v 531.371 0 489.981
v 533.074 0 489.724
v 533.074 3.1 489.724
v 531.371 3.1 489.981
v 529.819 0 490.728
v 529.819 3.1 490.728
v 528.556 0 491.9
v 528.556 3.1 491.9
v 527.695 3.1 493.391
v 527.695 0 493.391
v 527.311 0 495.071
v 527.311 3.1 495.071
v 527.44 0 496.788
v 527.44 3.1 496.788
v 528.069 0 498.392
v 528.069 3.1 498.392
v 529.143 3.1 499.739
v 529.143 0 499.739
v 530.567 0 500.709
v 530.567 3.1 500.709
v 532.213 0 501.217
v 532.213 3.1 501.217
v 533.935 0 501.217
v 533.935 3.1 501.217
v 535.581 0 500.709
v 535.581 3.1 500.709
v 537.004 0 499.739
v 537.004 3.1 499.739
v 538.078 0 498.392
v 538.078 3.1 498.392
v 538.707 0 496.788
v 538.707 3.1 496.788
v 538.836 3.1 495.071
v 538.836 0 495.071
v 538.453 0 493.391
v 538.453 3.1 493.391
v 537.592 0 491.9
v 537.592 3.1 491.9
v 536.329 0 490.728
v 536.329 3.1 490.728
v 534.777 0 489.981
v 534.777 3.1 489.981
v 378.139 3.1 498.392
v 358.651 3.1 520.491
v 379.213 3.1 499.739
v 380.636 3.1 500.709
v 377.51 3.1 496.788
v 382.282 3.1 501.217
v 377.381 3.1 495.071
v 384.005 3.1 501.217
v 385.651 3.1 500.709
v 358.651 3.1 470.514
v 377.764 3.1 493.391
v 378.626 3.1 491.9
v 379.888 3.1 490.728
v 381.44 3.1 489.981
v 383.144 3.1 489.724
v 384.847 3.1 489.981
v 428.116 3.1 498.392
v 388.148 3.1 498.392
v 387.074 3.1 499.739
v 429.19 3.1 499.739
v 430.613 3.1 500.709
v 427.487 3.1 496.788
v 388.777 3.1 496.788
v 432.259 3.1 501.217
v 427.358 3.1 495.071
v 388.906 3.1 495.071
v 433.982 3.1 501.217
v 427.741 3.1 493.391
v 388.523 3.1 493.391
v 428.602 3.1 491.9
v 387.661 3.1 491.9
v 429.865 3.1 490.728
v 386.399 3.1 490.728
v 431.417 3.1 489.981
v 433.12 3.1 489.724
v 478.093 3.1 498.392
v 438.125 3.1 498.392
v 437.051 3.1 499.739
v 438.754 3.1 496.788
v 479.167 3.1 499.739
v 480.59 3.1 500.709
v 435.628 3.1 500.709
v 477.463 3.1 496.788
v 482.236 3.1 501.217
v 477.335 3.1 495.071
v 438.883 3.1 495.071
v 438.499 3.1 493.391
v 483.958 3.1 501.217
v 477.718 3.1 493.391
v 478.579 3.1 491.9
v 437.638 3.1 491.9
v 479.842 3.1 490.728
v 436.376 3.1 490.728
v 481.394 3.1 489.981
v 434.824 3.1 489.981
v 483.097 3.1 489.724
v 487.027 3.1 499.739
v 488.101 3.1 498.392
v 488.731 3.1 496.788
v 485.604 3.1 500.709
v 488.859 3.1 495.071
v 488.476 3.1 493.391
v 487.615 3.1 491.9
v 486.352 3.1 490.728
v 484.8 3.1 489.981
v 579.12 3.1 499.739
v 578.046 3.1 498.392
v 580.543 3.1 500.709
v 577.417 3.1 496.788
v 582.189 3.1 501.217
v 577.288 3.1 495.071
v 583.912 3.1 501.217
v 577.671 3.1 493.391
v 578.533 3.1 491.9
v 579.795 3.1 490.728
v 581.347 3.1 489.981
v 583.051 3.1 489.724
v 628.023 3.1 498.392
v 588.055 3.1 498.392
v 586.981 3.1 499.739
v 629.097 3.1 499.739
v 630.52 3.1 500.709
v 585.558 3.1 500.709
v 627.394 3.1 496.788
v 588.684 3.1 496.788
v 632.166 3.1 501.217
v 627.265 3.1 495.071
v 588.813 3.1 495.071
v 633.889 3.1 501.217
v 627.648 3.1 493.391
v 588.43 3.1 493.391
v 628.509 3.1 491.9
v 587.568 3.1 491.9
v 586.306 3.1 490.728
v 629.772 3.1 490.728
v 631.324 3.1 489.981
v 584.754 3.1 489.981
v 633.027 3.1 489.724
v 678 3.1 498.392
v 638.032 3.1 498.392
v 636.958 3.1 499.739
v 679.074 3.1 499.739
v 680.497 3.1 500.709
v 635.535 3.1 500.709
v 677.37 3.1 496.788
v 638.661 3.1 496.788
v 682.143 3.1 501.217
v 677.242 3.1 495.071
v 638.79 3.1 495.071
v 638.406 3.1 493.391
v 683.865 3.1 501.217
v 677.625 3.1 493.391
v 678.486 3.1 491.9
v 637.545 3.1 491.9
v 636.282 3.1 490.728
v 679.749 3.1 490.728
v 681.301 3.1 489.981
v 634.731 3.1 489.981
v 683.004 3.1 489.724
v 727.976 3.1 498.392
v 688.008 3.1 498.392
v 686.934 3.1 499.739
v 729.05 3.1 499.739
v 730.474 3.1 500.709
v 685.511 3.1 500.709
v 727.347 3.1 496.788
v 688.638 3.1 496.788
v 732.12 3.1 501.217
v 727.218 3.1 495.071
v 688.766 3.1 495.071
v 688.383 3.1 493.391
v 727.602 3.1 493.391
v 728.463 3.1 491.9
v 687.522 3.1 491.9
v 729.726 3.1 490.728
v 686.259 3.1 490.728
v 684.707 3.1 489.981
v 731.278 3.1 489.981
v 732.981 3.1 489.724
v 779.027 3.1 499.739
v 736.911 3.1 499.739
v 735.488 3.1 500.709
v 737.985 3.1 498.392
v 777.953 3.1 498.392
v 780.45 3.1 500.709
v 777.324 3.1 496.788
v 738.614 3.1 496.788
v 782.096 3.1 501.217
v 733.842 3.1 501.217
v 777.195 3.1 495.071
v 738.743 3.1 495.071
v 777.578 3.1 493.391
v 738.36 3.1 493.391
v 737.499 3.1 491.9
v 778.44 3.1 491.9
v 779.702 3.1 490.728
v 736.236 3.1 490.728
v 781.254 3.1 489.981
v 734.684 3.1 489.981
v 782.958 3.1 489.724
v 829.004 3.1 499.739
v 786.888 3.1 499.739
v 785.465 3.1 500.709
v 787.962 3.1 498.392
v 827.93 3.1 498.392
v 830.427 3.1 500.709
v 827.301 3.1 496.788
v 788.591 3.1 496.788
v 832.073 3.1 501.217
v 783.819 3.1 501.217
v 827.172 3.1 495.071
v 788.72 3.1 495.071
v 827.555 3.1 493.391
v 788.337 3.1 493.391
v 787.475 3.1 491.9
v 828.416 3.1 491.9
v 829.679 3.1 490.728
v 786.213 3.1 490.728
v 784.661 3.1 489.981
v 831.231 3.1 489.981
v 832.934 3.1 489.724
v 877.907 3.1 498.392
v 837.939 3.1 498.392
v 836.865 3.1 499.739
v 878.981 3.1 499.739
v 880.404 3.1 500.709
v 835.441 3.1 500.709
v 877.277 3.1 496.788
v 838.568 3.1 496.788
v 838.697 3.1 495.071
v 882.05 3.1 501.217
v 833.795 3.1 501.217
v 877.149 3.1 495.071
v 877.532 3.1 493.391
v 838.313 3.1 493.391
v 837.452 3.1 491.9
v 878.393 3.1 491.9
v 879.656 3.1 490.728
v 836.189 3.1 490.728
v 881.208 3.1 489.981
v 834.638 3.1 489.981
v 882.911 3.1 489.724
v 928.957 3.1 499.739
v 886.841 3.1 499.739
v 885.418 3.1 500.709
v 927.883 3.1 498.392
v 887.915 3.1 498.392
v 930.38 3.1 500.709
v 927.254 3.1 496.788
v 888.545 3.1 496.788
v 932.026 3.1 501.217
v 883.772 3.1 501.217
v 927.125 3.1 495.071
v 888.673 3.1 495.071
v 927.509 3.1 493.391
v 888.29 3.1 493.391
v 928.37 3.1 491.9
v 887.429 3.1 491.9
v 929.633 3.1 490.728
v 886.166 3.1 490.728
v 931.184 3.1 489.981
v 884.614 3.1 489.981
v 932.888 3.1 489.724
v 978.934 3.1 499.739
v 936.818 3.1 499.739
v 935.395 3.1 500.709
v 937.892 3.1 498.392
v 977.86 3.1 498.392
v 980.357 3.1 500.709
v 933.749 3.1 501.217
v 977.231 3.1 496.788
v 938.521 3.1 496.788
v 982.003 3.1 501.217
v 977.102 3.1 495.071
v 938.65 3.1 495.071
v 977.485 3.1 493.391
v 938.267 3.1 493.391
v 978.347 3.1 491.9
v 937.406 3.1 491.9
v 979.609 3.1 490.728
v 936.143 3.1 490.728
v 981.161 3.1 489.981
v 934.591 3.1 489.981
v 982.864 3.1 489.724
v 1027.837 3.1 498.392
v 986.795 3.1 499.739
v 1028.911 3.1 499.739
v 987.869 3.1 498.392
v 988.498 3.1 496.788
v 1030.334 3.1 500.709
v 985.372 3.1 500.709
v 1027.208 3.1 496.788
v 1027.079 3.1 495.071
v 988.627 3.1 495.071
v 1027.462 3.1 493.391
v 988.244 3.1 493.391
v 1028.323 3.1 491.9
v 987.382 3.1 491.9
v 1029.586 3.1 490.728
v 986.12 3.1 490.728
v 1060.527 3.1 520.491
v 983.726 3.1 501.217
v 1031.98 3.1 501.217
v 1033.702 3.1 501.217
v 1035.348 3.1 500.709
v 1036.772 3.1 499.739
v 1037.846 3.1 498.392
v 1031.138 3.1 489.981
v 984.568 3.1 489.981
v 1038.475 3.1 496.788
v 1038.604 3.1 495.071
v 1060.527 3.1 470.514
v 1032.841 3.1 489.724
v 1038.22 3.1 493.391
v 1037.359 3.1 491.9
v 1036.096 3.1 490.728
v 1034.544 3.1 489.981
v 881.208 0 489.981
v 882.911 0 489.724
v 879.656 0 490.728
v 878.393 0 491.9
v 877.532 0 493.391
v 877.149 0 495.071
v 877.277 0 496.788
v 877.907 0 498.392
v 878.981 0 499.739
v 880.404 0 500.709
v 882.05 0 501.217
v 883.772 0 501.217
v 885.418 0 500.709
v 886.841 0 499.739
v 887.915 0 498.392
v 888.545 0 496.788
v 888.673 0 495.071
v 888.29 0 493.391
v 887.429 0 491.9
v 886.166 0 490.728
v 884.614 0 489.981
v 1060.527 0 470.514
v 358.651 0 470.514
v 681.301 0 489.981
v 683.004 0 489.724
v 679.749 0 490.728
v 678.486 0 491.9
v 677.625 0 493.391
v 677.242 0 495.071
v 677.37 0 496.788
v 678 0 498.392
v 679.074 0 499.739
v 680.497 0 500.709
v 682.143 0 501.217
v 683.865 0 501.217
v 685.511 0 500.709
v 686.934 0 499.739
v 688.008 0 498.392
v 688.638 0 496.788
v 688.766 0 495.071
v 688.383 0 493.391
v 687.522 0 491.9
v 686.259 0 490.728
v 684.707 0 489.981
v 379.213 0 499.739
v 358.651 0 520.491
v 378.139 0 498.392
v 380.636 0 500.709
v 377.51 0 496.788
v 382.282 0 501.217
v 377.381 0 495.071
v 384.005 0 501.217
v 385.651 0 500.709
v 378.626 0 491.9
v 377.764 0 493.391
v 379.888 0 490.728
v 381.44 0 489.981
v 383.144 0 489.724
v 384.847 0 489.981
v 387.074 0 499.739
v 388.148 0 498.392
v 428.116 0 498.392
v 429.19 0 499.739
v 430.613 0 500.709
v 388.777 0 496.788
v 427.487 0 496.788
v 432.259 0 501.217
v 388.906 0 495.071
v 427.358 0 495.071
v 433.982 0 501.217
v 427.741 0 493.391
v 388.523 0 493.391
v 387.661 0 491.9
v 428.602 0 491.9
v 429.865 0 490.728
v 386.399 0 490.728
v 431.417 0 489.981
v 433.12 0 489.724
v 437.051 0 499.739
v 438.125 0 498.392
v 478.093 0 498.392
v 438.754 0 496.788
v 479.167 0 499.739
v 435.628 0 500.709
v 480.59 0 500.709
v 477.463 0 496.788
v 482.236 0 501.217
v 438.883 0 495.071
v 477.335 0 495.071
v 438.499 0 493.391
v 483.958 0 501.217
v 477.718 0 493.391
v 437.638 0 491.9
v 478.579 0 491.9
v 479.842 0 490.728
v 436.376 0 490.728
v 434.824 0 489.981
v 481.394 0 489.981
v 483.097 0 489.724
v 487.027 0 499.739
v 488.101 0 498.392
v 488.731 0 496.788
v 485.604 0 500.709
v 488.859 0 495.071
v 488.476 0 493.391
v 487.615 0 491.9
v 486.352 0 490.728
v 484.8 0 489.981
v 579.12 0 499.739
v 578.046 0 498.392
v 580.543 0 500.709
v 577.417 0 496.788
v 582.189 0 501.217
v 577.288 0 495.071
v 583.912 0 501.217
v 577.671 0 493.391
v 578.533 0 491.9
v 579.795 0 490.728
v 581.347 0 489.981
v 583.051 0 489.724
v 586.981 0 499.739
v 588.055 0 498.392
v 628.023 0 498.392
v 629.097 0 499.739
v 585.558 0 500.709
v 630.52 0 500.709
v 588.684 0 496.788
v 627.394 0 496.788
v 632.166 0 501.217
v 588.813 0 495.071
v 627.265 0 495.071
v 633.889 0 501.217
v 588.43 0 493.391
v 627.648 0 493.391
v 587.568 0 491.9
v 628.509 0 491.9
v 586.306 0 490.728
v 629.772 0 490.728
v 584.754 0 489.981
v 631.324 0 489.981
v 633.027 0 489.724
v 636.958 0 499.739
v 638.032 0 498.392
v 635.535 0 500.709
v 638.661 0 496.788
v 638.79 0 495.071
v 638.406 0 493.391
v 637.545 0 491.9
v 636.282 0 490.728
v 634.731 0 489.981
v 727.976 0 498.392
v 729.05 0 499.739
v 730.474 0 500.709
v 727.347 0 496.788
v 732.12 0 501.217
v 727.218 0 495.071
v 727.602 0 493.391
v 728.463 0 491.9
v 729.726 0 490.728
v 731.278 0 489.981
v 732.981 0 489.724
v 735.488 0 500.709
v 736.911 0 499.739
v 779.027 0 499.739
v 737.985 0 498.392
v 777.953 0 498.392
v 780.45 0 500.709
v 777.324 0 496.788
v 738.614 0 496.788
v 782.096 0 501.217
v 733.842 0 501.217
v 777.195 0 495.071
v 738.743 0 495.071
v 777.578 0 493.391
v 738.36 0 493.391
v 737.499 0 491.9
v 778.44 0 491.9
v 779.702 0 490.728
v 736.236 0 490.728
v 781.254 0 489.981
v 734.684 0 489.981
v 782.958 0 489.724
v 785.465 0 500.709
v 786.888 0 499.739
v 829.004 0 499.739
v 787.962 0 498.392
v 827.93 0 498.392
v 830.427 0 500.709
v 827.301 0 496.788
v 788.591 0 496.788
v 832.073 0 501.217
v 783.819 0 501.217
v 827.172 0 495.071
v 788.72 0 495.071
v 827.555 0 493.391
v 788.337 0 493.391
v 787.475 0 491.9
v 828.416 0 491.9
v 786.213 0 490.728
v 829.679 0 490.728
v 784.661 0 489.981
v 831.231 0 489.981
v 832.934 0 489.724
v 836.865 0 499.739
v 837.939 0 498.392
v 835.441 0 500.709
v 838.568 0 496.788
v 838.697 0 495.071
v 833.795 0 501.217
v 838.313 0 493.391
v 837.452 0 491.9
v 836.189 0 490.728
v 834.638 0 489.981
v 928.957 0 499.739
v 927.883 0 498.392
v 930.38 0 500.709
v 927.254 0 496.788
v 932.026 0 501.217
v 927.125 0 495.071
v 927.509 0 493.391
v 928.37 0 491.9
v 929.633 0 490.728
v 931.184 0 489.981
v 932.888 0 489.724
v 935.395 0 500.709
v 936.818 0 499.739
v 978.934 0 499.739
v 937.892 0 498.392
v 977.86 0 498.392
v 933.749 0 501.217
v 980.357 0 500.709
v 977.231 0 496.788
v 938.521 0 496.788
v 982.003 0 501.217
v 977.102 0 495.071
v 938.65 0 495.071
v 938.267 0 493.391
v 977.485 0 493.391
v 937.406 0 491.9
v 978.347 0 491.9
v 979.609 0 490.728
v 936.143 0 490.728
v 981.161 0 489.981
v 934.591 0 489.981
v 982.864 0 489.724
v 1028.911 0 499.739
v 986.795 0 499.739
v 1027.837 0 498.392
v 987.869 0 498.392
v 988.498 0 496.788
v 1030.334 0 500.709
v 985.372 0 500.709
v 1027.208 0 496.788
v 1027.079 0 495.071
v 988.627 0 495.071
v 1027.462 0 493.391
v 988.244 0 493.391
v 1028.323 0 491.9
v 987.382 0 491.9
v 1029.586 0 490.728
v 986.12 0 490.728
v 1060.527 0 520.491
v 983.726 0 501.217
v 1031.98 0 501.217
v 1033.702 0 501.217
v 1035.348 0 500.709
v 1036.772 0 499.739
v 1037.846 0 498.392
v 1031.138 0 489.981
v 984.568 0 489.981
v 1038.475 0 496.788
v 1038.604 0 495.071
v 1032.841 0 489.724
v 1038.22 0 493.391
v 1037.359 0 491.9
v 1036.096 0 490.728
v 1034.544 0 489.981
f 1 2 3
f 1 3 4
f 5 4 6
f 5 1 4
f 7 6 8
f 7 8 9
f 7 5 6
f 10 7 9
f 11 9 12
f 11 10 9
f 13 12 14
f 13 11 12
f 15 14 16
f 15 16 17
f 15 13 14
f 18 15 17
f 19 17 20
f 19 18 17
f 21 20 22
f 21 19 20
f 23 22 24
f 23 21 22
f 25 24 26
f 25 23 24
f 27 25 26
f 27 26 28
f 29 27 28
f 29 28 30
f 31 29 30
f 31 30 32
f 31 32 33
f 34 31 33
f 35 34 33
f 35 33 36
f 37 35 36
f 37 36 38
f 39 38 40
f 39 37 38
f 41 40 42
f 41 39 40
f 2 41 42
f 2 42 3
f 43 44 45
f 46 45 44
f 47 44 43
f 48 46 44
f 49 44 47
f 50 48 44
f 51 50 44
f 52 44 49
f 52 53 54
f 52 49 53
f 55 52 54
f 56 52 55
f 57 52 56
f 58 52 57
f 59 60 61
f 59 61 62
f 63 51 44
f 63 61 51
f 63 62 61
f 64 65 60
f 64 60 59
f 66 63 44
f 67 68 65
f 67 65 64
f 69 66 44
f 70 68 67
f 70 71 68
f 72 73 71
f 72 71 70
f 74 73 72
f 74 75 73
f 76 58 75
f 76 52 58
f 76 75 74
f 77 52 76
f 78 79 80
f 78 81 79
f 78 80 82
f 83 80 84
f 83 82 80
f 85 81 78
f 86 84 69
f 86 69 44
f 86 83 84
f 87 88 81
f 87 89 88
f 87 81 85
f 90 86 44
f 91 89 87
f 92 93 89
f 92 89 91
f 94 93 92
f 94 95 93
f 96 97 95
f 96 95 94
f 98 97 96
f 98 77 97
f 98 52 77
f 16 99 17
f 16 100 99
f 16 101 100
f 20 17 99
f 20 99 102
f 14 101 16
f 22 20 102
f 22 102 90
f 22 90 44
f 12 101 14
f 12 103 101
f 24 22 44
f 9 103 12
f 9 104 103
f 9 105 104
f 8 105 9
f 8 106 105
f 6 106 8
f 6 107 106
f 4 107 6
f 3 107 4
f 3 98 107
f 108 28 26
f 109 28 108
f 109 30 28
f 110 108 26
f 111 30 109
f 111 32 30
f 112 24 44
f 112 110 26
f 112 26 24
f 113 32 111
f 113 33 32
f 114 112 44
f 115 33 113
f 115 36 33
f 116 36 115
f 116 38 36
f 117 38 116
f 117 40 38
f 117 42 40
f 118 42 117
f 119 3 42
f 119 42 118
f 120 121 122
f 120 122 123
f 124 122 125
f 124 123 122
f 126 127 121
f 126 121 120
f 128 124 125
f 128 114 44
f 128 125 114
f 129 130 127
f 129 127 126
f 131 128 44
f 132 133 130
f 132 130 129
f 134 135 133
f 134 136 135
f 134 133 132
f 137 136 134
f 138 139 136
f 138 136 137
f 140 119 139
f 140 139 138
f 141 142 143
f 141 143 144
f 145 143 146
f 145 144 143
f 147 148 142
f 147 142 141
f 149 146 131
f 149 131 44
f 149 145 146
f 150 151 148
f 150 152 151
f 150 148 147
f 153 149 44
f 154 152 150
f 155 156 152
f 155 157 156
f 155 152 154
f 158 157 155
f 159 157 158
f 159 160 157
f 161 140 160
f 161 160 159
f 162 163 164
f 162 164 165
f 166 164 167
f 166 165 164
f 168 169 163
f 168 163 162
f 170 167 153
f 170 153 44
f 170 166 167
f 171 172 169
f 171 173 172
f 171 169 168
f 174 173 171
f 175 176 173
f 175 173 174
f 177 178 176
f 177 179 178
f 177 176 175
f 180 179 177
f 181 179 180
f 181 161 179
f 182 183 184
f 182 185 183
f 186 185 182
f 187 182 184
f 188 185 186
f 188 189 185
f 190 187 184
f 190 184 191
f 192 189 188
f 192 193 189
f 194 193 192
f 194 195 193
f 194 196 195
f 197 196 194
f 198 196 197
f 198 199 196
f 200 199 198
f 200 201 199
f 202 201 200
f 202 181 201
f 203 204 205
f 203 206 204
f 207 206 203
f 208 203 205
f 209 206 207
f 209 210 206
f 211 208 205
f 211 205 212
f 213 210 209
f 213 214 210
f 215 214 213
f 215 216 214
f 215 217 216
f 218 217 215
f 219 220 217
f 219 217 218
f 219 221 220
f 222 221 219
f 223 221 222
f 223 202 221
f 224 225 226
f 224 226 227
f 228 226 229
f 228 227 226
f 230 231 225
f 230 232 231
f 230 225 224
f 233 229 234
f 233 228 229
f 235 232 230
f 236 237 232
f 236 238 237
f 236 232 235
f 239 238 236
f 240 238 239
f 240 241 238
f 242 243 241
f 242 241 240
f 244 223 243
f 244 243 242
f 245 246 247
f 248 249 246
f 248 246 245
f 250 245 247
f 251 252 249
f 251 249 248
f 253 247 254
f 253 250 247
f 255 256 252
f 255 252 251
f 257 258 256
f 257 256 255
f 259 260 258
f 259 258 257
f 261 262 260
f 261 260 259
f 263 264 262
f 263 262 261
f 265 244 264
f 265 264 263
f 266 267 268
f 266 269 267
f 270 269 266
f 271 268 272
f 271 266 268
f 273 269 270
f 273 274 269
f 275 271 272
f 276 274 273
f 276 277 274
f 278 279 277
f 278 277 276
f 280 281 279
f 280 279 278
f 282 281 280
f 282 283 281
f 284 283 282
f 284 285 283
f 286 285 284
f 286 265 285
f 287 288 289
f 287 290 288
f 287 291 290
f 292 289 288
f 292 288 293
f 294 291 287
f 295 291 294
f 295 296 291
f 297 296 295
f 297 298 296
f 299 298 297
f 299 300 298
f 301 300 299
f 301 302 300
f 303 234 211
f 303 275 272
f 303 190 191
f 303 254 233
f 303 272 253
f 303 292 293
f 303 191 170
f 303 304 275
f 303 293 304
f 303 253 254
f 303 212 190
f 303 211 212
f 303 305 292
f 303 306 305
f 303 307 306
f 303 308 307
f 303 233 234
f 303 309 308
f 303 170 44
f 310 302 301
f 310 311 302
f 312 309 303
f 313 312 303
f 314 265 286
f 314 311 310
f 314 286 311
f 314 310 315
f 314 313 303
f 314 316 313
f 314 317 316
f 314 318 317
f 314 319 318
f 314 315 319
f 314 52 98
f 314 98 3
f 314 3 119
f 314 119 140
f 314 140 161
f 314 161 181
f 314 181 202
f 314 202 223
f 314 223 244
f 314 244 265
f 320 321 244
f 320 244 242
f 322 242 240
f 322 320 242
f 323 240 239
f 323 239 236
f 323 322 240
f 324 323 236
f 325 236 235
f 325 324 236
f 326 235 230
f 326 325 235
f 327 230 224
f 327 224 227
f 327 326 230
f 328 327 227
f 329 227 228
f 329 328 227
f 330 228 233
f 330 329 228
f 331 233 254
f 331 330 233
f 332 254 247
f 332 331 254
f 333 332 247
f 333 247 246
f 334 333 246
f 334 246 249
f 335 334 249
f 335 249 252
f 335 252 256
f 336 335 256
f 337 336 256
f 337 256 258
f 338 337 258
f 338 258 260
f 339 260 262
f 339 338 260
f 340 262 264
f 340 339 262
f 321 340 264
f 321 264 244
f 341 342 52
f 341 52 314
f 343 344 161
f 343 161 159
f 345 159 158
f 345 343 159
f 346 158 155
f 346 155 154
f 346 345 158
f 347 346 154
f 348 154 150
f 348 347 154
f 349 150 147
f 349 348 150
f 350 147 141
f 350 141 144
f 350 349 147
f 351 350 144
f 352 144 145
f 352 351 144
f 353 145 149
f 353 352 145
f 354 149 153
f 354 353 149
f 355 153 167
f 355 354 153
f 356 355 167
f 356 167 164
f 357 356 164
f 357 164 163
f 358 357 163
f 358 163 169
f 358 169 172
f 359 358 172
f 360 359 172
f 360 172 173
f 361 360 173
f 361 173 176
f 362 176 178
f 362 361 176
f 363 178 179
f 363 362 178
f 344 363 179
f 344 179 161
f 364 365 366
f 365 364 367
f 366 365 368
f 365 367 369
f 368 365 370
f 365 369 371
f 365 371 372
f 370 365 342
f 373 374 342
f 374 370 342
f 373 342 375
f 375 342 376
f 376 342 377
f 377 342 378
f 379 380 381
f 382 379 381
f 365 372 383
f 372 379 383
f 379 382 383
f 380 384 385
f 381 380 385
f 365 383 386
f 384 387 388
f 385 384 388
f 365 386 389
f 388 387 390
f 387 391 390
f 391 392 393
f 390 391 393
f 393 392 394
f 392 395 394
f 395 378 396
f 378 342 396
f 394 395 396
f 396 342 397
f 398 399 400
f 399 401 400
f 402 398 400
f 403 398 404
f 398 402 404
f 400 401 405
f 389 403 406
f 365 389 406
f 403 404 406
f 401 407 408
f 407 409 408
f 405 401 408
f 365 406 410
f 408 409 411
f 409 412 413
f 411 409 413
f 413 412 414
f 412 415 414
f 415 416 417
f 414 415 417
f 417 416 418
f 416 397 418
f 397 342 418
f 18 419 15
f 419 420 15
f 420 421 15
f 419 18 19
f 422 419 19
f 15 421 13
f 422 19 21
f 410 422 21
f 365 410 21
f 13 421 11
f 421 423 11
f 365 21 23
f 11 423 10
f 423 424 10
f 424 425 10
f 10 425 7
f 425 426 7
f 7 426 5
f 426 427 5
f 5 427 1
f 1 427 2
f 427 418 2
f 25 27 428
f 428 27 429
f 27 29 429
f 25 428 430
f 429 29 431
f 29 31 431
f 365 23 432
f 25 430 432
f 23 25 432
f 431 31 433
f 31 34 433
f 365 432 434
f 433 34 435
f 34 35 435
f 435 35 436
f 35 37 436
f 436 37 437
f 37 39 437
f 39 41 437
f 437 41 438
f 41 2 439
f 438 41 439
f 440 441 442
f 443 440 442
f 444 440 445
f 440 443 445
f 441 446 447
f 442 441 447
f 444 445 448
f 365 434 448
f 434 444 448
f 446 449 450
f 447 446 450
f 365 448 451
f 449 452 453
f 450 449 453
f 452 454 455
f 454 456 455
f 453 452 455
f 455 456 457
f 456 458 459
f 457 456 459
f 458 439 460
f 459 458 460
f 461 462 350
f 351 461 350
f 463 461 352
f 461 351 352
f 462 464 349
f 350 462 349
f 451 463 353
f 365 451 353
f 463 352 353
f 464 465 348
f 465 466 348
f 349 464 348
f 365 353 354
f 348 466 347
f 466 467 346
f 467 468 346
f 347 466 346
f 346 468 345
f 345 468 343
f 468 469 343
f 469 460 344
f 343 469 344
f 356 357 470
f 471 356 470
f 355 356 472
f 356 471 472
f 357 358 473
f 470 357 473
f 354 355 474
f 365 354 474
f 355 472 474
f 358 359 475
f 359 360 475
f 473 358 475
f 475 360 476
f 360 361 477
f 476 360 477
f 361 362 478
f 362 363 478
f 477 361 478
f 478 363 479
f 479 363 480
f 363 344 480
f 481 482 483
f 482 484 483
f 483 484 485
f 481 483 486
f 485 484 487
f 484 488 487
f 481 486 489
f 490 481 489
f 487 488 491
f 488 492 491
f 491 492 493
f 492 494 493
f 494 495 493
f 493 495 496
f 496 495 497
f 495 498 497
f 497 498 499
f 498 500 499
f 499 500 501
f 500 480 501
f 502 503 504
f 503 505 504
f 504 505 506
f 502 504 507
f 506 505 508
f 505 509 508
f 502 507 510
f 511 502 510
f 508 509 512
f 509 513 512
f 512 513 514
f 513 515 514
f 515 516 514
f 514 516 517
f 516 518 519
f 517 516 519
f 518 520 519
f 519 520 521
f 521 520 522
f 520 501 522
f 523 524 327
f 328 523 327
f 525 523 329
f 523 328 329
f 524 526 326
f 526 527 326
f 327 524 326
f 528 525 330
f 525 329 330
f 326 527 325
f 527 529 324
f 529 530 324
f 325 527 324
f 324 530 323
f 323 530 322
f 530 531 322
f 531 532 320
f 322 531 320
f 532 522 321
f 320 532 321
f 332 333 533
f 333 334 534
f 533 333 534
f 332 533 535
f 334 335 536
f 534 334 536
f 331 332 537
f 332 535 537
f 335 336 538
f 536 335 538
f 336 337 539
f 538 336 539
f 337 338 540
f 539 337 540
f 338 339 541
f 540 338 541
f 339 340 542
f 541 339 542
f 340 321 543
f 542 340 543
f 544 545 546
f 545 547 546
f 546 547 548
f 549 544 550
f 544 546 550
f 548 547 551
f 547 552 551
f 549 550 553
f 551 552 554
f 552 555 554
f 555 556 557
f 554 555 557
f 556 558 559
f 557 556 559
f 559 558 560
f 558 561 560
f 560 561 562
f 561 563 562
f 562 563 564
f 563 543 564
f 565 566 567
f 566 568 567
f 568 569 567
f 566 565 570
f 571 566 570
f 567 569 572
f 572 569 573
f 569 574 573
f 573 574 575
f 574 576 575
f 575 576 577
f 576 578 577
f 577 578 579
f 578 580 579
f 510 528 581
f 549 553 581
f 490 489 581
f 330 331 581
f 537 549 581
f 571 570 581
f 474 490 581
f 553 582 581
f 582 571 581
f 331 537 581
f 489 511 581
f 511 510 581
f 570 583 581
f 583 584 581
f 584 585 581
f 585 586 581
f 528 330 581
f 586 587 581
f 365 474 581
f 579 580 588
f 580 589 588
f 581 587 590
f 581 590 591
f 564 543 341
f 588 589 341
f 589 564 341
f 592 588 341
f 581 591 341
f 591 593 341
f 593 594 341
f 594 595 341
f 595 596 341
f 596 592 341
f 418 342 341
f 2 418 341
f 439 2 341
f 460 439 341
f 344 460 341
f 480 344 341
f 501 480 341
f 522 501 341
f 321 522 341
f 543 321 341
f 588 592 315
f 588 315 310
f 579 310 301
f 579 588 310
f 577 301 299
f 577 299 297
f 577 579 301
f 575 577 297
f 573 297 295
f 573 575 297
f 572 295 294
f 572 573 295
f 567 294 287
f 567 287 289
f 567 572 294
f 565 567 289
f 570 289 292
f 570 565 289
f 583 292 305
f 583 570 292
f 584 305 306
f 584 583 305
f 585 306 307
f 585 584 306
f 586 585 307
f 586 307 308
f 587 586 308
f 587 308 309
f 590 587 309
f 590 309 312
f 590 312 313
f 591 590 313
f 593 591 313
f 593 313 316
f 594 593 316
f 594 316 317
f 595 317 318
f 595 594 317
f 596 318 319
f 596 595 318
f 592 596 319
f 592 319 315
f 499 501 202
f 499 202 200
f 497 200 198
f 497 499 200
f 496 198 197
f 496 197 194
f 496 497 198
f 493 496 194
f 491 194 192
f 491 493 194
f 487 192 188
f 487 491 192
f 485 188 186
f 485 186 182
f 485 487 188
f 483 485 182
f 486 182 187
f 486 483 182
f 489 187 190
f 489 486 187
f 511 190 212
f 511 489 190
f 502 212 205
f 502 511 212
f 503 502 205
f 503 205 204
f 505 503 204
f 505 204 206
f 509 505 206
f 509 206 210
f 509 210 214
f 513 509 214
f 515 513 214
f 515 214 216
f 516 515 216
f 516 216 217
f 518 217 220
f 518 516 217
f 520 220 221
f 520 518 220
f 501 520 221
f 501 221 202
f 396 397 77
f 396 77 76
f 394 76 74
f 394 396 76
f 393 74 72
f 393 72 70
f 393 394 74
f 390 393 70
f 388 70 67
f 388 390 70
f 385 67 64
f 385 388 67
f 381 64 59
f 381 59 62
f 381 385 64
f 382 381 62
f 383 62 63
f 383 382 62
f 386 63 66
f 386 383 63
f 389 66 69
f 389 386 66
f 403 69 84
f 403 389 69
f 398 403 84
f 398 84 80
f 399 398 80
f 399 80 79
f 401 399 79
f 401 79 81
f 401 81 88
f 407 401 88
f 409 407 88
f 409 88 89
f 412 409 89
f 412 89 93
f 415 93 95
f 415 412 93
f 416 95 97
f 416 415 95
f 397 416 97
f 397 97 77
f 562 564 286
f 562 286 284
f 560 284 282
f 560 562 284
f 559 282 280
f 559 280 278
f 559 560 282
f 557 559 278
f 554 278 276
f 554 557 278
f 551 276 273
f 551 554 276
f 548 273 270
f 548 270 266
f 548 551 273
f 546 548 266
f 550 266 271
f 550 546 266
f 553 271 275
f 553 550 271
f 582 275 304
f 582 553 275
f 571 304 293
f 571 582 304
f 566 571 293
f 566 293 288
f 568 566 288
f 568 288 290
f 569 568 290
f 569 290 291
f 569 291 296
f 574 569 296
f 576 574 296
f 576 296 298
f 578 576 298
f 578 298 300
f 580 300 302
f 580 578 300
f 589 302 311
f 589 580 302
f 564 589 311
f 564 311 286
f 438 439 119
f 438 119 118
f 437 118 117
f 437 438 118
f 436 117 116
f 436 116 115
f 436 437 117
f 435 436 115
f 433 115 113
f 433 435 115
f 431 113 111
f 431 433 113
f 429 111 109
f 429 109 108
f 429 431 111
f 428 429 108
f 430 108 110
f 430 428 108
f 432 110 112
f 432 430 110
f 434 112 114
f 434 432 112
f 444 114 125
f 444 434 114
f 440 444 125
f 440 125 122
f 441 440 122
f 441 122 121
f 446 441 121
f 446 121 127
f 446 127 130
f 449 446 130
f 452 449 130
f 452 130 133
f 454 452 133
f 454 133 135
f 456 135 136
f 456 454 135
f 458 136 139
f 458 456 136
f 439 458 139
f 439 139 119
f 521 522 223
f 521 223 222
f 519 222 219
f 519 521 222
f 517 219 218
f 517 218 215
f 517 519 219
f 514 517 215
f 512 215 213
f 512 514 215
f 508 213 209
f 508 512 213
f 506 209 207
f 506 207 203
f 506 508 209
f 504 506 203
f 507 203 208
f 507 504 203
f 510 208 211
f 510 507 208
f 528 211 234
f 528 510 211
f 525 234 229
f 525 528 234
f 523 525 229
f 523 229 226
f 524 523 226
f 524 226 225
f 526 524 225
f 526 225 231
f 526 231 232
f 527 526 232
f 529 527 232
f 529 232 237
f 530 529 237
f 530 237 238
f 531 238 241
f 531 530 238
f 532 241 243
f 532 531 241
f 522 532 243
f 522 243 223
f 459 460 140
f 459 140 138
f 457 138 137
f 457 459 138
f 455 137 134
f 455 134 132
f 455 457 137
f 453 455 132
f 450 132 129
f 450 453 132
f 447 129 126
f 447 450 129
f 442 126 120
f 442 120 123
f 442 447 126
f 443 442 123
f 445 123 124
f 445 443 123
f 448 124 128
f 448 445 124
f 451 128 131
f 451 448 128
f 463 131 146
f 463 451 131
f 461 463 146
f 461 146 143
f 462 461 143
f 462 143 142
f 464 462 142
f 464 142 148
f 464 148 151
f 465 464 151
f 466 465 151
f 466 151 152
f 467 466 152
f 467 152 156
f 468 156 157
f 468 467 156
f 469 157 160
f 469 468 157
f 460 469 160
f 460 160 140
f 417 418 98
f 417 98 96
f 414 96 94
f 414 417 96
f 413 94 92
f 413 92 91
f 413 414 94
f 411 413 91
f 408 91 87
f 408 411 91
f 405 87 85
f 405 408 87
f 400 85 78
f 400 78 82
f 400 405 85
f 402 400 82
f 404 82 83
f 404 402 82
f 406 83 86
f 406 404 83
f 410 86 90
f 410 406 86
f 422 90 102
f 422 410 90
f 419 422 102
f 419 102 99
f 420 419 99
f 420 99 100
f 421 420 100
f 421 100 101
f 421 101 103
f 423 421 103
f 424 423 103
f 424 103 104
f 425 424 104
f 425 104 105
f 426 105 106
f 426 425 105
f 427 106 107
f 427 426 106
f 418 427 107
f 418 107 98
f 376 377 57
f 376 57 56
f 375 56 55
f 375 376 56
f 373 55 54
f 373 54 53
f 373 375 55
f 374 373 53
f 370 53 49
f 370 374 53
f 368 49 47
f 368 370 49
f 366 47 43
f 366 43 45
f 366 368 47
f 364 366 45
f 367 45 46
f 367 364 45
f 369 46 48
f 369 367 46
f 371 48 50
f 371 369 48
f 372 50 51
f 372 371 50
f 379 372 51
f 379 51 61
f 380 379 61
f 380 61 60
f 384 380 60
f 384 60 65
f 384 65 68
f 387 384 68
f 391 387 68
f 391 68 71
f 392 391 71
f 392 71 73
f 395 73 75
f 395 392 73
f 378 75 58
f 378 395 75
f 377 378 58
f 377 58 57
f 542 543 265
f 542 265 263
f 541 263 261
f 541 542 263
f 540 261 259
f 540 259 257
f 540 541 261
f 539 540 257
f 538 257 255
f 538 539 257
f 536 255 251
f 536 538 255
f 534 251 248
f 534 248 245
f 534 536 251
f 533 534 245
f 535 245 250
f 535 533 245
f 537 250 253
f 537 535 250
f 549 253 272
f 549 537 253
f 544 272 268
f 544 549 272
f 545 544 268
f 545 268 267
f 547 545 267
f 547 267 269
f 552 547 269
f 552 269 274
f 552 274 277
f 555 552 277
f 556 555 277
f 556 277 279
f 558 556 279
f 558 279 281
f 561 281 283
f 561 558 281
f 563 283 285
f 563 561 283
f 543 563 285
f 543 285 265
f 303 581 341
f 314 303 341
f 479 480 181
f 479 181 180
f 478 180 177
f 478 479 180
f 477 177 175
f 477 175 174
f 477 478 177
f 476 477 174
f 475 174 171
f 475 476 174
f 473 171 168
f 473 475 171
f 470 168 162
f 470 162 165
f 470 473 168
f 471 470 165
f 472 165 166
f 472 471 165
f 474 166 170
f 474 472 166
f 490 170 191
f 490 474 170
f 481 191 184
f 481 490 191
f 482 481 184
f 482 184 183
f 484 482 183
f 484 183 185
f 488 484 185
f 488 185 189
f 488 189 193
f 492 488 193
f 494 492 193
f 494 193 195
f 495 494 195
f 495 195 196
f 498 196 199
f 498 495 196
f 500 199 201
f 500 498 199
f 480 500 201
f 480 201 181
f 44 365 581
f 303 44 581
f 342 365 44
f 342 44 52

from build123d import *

# Parameters (mm, degrees)
SKETCH1_W           = 701.876631599
SKETCH1_H           = 49.976737776
SKETCH1_R           = 5.778560305
BOSS_EXTRUDE1_DEPTH = 3.1


with BuildPart() as part:
    # Sketch1 → Boss-Extrude1 (new body)
    with BuildSketch(Plane(origin=(0, 0, 0), x_dir=(1, 0, 0), z_dir=(0, 1, 0))):
        with Locations((709.588876406, -495.502605974)):
            Rectangle(SKETCH1_W, SKETCH1_H)
        with Locations(Location((383.143601119, -495.502605974, 0), (0, 0, 90))):
            Circle(SKETCH1_R, mode=Mode.SUBTRACT)
        with Locations(Location((433.120338895, -495.502605974, 0), (0, 0, 90))):
            Circle(SKETCH1_R, mode=Mode.SUBTRACT)
        with Locations(Location((483.097076671, -495.502605974, 0), (0, 0, 90))):
            Circle(SKETCH1_R, mode=Mode.SUBTRACT)
        with Locations(Location((533.073814447, -495.502605974, 0), (0, 0, 90))):
            Circle(SKETCH1_R, mode=Mode.SUBTRACT)
        with Locations(Location((583.050552222, -495.502605974, 0), (0, 0, 90))):
            Circle(SKETCH1_R, mode=Mode.SUBTRACT)
        with Locations(Location((633.027289998, -495.502605974, 0), (0, 0, 90))):
            Circle(SKETCH1_R, mode=Mode.SUBTRACT)
        with Locations(Location((683.004027774, -495.502605974, 0), (0, 0, 90))):
            Circle(SKETCH1_R, mode=Mode.SUBTRACT)
        with Locations(Location((732.98076555, -495.502605974, 0), (0, 0, 90))):
            Circle(SKETCH1_R, mode=Mode.SUBTRACT)
        with Locations(Location((782.957503326, -495.502605974, 0), (0, 0, 90))):
            Circle(SKETCH1_R, mode=Mode.SUBTRACT)
        with Locations(Location((832.934241102, -495.502605974, 0), (0, 0, 90))):
            Circle(SKETCH1_R, mode=Mode.SUBTRACT)
        with Locations(Location((882.910978877, -495.502605974, 0), (0, 0, 90))):
            Circle(SKETCH1_R, mode=Mode.SUBTRACT)
        with Locations(Location((932.887716653, -495.502605974, 0), (0, 0, 90))):
            Circle(SKETCH1_R, mode=Mode.SUBTRACT)
        with Locations(Location((982.864454429, -495.502605974, 0), (0, 0, 90))):
            Circle(SKETCH1_R, mode=Mode.SUBTRACT)
        with Locations(Location((1032.841192205, -495.502605974, 0), (0, 0, 90))):
            Circle(SKETCH1_R, mode=Mode.SUBTRACT)
    extrude(amount=BOSS_EXTRUDE1_DEPTH)


solid = part.part
